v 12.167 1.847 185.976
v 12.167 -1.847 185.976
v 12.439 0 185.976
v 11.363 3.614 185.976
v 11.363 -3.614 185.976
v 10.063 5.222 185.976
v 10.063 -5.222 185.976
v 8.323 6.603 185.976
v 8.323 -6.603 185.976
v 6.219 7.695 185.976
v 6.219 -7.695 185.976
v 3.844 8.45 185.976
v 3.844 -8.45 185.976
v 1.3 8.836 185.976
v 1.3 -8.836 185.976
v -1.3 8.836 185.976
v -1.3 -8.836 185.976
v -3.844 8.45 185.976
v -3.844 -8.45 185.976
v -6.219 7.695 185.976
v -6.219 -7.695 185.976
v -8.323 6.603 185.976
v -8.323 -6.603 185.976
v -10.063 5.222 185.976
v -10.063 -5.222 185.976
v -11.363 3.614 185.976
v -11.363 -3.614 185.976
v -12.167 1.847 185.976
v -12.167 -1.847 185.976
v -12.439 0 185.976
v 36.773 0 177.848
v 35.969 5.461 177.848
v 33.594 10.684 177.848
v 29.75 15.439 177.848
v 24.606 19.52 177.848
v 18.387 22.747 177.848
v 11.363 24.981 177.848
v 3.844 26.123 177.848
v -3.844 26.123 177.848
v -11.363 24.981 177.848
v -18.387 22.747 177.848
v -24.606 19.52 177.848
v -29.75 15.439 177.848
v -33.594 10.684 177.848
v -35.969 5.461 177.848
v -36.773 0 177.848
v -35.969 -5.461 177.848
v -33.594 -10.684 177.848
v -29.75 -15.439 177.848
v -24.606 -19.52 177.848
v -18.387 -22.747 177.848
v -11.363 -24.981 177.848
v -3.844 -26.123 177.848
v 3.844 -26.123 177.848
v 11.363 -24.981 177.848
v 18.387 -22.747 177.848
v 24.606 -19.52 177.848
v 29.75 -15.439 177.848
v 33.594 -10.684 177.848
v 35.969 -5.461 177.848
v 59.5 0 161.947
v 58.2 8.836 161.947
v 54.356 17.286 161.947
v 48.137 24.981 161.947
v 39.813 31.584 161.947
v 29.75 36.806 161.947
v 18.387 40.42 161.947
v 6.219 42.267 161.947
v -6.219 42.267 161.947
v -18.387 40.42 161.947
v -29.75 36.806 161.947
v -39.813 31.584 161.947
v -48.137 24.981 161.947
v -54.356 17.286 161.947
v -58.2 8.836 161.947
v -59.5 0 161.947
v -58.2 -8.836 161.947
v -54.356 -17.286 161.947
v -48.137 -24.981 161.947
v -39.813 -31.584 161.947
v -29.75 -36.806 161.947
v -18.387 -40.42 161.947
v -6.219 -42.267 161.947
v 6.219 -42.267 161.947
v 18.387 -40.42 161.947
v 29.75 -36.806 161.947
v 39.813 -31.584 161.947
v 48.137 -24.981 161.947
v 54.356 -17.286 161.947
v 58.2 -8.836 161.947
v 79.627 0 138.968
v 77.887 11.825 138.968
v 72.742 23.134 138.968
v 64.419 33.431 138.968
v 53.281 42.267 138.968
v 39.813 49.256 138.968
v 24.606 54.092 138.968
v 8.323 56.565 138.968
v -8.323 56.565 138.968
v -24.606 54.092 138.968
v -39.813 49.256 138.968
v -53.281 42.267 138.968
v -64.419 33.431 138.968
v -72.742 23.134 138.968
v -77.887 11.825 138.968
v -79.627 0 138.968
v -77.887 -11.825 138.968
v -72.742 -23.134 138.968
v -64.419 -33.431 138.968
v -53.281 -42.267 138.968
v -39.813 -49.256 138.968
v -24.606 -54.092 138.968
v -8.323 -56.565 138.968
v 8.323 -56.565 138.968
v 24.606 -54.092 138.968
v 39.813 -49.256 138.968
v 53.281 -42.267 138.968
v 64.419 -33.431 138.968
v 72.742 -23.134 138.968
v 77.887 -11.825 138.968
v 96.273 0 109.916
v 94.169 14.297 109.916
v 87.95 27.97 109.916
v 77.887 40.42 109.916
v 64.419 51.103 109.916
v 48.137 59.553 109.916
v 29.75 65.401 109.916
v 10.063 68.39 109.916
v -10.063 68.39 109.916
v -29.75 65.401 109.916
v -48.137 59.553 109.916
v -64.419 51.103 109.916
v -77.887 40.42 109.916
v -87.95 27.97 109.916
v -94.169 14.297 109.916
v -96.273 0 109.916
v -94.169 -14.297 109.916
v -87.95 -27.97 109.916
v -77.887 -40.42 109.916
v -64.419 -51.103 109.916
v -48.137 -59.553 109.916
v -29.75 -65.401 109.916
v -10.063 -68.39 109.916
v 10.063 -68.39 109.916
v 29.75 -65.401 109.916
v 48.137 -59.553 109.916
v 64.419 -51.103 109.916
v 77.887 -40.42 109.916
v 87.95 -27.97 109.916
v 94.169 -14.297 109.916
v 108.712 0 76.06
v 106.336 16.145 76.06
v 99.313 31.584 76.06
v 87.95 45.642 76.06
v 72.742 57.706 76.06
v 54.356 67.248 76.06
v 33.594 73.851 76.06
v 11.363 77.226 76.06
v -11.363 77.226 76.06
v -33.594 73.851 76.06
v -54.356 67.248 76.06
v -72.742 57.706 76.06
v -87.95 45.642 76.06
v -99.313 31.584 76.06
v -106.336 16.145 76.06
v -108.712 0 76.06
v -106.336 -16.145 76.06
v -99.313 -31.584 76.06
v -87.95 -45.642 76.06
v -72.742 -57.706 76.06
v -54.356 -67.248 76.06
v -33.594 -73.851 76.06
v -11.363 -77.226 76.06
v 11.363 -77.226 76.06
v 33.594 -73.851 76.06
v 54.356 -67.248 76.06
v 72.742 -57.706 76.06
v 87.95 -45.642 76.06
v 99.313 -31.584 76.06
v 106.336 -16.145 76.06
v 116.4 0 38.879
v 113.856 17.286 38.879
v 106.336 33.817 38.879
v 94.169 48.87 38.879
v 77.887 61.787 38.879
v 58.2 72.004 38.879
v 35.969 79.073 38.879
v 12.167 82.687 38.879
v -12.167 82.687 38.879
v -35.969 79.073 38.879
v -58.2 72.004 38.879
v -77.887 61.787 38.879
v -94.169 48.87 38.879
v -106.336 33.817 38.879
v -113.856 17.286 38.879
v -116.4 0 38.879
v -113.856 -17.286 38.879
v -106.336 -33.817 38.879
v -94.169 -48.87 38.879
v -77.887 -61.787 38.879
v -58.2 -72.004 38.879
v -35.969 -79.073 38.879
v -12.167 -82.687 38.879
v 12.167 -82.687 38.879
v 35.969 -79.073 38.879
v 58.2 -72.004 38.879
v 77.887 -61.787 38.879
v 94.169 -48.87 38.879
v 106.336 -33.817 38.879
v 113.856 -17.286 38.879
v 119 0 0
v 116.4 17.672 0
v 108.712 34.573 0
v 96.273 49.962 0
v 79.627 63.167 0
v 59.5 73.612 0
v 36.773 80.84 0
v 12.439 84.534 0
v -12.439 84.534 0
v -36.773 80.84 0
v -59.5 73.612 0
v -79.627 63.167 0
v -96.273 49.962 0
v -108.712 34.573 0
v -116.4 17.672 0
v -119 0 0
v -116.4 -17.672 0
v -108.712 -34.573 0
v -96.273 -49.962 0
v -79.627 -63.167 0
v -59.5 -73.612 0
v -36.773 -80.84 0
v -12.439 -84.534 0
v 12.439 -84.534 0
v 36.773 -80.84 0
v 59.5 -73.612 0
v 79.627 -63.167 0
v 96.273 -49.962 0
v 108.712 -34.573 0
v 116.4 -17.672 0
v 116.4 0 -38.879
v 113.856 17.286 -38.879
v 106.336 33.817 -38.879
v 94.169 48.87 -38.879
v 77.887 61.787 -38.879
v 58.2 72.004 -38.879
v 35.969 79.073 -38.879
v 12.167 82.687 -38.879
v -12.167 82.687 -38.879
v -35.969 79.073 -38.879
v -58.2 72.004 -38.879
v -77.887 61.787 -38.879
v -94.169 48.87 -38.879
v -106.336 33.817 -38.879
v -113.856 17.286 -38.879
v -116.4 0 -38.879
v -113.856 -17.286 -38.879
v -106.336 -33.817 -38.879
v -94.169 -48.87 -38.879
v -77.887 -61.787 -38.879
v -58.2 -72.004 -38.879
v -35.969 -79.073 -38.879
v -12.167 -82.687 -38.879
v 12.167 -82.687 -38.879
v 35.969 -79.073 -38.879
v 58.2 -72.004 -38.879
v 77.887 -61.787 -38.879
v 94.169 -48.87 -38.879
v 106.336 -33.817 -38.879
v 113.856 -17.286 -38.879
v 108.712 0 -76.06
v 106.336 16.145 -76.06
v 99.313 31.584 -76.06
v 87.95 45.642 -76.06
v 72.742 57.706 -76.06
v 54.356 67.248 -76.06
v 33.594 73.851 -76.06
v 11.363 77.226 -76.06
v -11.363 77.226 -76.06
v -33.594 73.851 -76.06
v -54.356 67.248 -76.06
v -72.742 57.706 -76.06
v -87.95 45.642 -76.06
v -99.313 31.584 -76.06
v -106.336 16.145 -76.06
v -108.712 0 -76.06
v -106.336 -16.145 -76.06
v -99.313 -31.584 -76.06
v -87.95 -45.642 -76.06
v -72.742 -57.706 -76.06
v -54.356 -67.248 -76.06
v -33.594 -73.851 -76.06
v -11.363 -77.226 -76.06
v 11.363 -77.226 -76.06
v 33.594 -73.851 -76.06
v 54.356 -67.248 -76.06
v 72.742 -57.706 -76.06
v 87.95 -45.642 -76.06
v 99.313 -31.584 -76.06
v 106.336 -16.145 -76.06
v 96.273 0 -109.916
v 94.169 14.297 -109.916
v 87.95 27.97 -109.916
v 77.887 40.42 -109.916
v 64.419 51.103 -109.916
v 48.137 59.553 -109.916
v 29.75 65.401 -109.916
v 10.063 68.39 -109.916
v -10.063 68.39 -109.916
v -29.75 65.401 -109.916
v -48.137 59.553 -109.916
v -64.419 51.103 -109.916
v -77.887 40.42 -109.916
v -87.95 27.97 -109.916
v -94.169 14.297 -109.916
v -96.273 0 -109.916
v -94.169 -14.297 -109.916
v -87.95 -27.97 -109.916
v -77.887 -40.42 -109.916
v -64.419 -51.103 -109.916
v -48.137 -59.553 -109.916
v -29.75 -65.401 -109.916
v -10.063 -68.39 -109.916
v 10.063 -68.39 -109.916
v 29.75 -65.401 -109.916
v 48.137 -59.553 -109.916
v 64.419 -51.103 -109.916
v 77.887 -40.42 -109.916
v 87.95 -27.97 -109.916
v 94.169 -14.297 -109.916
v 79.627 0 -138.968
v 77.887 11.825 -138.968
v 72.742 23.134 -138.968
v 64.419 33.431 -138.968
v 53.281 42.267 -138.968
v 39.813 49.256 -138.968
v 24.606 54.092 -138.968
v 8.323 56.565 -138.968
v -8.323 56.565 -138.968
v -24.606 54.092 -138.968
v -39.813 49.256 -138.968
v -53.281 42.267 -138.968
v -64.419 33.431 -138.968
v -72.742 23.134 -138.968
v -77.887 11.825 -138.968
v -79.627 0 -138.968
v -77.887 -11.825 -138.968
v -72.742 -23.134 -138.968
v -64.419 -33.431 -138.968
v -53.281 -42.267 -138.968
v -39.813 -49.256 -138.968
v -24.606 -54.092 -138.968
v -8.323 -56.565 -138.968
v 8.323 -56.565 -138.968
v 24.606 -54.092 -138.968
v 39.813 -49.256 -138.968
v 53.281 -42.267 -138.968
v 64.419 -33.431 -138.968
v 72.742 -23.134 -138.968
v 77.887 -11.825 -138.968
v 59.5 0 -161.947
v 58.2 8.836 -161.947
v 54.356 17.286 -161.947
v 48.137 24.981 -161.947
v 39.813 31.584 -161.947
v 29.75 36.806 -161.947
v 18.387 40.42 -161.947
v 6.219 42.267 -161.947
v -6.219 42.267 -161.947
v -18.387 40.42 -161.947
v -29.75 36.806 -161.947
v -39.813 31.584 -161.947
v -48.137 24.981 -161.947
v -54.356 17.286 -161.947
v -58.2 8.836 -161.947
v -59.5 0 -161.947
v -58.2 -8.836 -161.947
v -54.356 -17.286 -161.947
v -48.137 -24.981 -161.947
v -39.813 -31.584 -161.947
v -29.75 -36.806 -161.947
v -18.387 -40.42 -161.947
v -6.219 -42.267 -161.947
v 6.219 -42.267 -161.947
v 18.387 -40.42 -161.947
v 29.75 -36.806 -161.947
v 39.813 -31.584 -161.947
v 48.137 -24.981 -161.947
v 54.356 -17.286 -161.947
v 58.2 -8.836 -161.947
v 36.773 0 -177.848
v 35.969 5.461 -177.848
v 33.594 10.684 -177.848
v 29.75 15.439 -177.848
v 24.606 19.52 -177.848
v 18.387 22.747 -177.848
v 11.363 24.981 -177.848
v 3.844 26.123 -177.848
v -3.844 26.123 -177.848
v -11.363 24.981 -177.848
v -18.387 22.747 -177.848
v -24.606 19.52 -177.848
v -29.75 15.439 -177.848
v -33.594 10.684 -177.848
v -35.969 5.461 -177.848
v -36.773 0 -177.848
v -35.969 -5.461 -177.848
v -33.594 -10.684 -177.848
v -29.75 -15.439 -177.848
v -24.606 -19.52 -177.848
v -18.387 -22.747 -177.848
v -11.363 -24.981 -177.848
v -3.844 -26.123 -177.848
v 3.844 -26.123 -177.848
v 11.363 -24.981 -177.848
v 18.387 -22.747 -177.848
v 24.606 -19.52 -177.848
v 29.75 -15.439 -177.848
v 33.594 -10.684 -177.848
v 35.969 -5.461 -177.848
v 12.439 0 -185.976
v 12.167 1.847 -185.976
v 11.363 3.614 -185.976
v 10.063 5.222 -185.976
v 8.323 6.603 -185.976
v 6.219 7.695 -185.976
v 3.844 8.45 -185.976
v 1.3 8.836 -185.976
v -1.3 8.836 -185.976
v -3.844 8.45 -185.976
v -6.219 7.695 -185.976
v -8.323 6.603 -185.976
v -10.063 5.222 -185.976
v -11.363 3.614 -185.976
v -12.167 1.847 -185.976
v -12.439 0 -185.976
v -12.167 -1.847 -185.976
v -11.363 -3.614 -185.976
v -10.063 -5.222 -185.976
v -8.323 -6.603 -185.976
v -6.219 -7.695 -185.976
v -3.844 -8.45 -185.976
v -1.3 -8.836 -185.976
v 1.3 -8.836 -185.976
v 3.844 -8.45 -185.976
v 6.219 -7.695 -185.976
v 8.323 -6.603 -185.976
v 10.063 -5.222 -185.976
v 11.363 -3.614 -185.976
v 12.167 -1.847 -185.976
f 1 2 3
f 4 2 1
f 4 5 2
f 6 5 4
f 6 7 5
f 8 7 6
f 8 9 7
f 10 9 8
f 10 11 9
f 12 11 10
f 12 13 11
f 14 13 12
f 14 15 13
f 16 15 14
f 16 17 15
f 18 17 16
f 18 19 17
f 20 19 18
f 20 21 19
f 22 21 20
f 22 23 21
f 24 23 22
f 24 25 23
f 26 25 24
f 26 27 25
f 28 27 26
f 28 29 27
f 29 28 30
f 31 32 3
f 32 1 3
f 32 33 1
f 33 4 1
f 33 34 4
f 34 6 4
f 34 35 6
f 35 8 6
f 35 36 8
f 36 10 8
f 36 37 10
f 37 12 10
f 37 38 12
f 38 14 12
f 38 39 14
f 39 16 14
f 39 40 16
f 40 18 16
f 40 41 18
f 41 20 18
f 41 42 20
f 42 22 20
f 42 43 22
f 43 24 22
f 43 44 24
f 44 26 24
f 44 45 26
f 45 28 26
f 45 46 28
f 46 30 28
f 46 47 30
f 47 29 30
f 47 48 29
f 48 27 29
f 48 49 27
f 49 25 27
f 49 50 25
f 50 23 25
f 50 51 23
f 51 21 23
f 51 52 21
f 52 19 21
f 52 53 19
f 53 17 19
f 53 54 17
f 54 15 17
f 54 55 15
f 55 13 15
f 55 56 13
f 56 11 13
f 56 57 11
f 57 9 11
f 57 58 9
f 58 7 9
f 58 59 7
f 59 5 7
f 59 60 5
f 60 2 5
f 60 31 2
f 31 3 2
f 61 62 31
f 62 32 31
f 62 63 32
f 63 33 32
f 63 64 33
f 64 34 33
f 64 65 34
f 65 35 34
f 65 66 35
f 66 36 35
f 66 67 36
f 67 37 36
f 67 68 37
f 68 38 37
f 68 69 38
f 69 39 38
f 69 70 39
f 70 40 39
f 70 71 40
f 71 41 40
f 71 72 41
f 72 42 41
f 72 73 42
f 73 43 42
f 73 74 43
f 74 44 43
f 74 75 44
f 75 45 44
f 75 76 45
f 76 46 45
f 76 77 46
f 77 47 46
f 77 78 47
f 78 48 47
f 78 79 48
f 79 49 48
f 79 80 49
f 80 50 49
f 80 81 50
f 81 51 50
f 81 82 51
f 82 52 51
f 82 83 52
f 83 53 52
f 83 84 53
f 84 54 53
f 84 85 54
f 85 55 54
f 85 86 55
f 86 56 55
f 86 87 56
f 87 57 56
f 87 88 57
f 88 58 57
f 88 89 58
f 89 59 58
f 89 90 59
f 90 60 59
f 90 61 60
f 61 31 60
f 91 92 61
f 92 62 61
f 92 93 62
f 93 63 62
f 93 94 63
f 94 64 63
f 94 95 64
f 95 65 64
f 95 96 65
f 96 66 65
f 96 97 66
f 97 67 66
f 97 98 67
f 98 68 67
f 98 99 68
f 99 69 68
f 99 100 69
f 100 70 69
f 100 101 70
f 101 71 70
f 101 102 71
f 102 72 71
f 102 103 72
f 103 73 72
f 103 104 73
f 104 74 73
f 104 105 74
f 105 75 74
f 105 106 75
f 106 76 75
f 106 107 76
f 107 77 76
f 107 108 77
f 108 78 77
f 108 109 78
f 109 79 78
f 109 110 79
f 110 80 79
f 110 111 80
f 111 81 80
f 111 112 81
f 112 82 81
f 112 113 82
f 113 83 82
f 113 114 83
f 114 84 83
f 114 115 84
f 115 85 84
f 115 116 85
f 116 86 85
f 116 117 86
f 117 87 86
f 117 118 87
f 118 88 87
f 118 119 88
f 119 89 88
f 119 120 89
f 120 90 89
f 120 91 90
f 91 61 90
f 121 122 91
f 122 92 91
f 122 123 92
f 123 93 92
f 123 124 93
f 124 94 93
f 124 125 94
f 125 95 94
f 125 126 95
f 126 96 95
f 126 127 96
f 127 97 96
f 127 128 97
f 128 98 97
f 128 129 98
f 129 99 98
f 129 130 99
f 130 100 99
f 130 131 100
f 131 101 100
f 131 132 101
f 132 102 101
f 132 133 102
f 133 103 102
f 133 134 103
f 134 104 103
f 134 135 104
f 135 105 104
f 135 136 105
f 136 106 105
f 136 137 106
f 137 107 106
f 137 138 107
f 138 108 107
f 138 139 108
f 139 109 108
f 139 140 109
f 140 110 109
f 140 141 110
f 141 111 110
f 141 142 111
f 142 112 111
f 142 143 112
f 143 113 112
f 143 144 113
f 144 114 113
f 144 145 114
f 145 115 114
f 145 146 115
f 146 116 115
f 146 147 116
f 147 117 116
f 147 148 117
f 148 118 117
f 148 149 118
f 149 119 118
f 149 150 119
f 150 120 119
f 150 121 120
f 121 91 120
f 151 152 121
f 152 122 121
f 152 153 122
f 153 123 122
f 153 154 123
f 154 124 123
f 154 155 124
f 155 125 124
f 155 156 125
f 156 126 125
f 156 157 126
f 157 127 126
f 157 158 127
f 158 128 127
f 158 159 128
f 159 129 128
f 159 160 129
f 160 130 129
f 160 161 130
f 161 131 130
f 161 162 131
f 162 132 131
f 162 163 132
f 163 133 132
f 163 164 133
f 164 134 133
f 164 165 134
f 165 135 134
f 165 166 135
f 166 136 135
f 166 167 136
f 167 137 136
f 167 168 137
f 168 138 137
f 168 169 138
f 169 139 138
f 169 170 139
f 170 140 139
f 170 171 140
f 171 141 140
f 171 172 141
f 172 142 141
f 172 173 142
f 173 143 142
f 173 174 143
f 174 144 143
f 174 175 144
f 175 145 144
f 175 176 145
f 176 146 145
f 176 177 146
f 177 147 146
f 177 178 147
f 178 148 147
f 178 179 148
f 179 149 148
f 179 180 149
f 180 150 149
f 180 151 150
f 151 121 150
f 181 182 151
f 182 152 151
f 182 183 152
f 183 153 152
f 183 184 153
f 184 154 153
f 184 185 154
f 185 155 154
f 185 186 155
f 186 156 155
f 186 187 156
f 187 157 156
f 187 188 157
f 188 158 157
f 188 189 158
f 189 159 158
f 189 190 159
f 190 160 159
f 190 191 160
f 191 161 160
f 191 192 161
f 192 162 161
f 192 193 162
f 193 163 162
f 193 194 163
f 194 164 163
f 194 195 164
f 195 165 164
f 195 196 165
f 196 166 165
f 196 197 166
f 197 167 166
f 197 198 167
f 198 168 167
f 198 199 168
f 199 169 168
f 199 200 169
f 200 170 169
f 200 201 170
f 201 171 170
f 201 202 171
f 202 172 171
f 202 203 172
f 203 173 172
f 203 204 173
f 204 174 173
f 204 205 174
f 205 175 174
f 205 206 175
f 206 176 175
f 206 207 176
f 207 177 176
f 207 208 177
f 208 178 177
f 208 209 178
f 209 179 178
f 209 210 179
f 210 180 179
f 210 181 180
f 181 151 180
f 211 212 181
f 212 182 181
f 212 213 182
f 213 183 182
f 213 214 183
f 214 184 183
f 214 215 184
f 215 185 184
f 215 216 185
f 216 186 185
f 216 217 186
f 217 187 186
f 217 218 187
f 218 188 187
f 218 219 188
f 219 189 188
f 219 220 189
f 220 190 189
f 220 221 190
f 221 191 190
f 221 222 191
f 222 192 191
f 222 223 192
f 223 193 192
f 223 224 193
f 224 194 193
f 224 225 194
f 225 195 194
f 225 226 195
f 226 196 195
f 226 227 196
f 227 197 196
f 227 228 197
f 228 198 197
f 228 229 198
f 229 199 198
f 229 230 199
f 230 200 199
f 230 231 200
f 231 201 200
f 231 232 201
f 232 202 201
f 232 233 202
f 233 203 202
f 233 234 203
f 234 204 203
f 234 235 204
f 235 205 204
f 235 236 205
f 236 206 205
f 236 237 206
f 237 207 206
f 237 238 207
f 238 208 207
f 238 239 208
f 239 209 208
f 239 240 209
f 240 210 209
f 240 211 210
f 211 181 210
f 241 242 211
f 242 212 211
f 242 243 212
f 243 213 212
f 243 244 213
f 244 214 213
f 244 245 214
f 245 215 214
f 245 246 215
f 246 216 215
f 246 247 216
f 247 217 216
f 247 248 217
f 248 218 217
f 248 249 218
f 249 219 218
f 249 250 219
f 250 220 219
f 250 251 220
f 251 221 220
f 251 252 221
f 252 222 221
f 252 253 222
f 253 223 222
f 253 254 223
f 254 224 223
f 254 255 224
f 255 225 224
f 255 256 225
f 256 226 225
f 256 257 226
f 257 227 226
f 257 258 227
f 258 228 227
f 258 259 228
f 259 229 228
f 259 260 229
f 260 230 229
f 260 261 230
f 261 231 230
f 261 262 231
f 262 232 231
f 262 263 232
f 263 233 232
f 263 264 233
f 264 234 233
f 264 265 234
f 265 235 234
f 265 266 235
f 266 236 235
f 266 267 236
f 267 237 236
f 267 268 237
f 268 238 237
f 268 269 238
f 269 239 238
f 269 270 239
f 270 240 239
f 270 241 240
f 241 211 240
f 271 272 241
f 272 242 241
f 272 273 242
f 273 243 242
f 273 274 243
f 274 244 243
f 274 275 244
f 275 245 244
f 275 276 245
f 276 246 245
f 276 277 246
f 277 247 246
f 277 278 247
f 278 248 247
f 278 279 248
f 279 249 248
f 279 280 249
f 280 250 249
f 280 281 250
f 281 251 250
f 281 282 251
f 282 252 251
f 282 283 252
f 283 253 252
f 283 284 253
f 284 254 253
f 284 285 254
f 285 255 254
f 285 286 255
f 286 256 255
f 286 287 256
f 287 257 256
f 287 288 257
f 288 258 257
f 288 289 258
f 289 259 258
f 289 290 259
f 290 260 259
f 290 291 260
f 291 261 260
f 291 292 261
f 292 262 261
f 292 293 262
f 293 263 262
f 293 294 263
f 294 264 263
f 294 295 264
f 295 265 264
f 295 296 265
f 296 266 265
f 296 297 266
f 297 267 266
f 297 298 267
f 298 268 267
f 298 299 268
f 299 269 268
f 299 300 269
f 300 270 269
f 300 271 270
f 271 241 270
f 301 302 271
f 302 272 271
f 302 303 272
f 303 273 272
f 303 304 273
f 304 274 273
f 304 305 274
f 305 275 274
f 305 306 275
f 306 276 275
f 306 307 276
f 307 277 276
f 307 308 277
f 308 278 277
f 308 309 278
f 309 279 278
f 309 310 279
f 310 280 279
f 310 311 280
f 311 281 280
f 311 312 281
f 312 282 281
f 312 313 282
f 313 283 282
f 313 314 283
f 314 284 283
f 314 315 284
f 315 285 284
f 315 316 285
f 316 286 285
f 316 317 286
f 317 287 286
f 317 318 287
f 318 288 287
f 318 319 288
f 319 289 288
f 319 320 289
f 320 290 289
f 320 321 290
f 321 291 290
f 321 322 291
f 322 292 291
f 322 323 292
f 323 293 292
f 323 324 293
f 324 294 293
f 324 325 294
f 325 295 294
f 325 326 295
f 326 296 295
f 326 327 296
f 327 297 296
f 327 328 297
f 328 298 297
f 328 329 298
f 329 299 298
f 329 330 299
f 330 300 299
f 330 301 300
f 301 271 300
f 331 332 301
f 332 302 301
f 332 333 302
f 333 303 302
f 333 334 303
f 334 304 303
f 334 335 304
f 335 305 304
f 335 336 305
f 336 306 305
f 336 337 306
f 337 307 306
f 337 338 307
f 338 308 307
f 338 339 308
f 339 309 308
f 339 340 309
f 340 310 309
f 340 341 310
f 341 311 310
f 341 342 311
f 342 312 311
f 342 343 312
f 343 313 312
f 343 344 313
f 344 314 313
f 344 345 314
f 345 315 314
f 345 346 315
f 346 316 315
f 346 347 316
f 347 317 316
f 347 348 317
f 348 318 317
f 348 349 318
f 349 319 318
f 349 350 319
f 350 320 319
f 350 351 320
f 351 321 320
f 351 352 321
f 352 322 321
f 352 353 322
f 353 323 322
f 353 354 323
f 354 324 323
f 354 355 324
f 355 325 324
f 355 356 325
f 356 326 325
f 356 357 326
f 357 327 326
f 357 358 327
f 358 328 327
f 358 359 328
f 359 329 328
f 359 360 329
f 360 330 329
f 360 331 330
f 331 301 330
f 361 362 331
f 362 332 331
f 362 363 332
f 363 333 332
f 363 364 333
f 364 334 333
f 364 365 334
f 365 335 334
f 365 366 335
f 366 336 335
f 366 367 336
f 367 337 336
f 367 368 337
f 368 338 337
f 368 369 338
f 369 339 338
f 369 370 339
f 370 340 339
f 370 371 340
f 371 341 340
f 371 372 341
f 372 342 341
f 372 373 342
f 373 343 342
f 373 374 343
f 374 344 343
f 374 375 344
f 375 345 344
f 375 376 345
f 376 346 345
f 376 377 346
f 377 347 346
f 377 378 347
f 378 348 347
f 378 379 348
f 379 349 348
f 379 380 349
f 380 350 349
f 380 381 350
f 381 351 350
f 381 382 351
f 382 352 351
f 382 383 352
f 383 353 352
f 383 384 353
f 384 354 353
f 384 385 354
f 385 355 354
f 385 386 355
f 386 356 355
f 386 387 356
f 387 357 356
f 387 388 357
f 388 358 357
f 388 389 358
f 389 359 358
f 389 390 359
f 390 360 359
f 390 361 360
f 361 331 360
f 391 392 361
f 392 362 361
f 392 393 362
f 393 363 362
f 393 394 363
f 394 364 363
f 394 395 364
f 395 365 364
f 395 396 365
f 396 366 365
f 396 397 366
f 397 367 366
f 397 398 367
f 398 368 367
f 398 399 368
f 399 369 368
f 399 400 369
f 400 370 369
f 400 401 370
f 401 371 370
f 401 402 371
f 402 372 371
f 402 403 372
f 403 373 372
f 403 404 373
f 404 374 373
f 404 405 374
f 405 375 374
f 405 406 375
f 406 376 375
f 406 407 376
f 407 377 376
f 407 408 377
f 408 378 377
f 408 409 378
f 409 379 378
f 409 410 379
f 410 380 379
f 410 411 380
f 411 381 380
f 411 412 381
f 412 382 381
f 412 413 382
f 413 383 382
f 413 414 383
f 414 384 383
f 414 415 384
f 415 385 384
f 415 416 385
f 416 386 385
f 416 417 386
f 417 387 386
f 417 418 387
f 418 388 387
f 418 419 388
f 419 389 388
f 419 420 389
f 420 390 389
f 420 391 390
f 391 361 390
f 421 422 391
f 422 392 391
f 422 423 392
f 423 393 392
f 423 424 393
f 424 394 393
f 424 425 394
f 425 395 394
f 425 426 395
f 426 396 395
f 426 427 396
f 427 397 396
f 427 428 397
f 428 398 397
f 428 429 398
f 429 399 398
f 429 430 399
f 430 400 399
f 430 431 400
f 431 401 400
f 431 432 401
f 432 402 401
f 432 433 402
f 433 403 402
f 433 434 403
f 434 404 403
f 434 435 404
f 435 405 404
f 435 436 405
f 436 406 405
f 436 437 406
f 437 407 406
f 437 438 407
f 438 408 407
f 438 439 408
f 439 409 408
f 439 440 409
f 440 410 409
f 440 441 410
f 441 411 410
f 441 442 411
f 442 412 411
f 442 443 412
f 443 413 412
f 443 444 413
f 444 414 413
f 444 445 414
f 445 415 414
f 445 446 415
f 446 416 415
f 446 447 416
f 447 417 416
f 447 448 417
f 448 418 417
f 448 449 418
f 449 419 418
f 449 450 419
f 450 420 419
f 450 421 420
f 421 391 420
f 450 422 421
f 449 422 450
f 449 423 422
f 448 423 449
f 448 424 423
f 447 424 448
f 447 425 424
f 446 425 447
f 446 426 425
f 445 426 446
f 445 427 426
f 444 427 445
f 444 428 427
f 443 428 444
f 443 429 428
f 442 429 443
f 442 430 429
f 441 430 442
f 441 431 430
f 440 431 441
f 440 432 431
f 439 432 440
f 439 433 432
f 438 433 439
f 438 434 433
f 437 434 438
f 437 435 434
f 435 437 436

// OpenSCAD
// Generated by SolidPython 1.0.1 on 2020-07-29 00:46:47


scale(v = [7, 5, 11]) {
	sphere(r = 17);
}
/***********************************************
*********      SolidPython code:      **********
************************************************
 
# import packages: SolidPython
from solid import *
from solid.utils import *
from itertools import chain, combinations, permutations


class Resize:

    def __init__(self, scad_file):
        self.scad_file = scad_file
        #self.scad_file = import_scad(scad_file)
        # cone/cylinder param:
        self.r1 = 0
        self.r2 = 0
        self.h = 0
        # rectangular prism param:
        self.w = 0
        self.l = 0
        # ellipse param:
        self.r = 0

    # import OpenScad code (file name corresponds to shape)


    # classify shape + parameters
    def assign(self, param1, param2, param3):
        if self.scad_file == 'cone.scad':
            self.r1 = param1
            self.r2 = param2
            self.h = param3
        elif self.scad_file == 'cylinder.scad':
            self.r1 = param1
            self.r2 = param2
            self.h = param3
        elif self.scad_file == 'rectangularPrism.scad':
            self.h = param1
            self.l = param2
            self.w = param3
        else:
            self.r = param1
            self.h = param2

    # resize parameters
    def iterate(self):
        x = range(3, 20, 2)
        i = 1
        if self.scad_file == 'cone.scad':
            tempList = list(permutations(x, 2))
            for temp in tempList:
                param1 = temp[0]
                param2 = temp[1]
                filepath = 'produced_scad_files/' + 'cone' + str(param1) + '_' + str(param2) + '_' + '.scad'
                scad_render_to_file(cylinder(h=param1, r1=param2, r2=0), filepath)

        elif self.scad_file == 'cylinder.scad':
            tempList = list(permutations(x, 3))
            for temp in tempList:
                param1 = temp[0]
                param2 = temp[1]
                filepath = 'produced_scad_files/' + 'cylinder' + str(param1) + '_' + str(param2) + '_' + '.scad'
                scad_render_to_file(cylinder(h=param1, r1=param2, r2=param2), filepath)

        elif self.scad_file == 'rectangularPrism.scad':
            tempList = list(permutations(x, 3))
            for temp in tempList:
                param1 = temp[0]
                param2 = temp[1]
                param3 = temp[2]
                filepath = 'produced_scad_files/' + 'rectangularPrism' + str(param1) + '_' + str(param2) + '_' + str(
                    param3) + '.scad'
                scad_render_to_file(cube(size=(param1, param2, param3)), filepath)

        elif self.scad_file == 'ellipse.scad':
            tempList = list(permutations(x, 4))
            for temp in tempList:
                param1 = temp[0]
                param2 = temp[1]
                param3 = temp[2]
                param4 = temp[3]
                filepath = 'produced_scad_files/' + 'ellipse' + str(param1) + '_' + str(param2) + '_' + str(param3) + '_' + str(param4) + '.scad'
                scad_render_to_file(scale([param1, param2, param3])(sphere(r=param4)), filepath)

    def render_to_scadfile(self):
        scad_render_to_file(scad, 'example.scad') 
 
************************************************/
